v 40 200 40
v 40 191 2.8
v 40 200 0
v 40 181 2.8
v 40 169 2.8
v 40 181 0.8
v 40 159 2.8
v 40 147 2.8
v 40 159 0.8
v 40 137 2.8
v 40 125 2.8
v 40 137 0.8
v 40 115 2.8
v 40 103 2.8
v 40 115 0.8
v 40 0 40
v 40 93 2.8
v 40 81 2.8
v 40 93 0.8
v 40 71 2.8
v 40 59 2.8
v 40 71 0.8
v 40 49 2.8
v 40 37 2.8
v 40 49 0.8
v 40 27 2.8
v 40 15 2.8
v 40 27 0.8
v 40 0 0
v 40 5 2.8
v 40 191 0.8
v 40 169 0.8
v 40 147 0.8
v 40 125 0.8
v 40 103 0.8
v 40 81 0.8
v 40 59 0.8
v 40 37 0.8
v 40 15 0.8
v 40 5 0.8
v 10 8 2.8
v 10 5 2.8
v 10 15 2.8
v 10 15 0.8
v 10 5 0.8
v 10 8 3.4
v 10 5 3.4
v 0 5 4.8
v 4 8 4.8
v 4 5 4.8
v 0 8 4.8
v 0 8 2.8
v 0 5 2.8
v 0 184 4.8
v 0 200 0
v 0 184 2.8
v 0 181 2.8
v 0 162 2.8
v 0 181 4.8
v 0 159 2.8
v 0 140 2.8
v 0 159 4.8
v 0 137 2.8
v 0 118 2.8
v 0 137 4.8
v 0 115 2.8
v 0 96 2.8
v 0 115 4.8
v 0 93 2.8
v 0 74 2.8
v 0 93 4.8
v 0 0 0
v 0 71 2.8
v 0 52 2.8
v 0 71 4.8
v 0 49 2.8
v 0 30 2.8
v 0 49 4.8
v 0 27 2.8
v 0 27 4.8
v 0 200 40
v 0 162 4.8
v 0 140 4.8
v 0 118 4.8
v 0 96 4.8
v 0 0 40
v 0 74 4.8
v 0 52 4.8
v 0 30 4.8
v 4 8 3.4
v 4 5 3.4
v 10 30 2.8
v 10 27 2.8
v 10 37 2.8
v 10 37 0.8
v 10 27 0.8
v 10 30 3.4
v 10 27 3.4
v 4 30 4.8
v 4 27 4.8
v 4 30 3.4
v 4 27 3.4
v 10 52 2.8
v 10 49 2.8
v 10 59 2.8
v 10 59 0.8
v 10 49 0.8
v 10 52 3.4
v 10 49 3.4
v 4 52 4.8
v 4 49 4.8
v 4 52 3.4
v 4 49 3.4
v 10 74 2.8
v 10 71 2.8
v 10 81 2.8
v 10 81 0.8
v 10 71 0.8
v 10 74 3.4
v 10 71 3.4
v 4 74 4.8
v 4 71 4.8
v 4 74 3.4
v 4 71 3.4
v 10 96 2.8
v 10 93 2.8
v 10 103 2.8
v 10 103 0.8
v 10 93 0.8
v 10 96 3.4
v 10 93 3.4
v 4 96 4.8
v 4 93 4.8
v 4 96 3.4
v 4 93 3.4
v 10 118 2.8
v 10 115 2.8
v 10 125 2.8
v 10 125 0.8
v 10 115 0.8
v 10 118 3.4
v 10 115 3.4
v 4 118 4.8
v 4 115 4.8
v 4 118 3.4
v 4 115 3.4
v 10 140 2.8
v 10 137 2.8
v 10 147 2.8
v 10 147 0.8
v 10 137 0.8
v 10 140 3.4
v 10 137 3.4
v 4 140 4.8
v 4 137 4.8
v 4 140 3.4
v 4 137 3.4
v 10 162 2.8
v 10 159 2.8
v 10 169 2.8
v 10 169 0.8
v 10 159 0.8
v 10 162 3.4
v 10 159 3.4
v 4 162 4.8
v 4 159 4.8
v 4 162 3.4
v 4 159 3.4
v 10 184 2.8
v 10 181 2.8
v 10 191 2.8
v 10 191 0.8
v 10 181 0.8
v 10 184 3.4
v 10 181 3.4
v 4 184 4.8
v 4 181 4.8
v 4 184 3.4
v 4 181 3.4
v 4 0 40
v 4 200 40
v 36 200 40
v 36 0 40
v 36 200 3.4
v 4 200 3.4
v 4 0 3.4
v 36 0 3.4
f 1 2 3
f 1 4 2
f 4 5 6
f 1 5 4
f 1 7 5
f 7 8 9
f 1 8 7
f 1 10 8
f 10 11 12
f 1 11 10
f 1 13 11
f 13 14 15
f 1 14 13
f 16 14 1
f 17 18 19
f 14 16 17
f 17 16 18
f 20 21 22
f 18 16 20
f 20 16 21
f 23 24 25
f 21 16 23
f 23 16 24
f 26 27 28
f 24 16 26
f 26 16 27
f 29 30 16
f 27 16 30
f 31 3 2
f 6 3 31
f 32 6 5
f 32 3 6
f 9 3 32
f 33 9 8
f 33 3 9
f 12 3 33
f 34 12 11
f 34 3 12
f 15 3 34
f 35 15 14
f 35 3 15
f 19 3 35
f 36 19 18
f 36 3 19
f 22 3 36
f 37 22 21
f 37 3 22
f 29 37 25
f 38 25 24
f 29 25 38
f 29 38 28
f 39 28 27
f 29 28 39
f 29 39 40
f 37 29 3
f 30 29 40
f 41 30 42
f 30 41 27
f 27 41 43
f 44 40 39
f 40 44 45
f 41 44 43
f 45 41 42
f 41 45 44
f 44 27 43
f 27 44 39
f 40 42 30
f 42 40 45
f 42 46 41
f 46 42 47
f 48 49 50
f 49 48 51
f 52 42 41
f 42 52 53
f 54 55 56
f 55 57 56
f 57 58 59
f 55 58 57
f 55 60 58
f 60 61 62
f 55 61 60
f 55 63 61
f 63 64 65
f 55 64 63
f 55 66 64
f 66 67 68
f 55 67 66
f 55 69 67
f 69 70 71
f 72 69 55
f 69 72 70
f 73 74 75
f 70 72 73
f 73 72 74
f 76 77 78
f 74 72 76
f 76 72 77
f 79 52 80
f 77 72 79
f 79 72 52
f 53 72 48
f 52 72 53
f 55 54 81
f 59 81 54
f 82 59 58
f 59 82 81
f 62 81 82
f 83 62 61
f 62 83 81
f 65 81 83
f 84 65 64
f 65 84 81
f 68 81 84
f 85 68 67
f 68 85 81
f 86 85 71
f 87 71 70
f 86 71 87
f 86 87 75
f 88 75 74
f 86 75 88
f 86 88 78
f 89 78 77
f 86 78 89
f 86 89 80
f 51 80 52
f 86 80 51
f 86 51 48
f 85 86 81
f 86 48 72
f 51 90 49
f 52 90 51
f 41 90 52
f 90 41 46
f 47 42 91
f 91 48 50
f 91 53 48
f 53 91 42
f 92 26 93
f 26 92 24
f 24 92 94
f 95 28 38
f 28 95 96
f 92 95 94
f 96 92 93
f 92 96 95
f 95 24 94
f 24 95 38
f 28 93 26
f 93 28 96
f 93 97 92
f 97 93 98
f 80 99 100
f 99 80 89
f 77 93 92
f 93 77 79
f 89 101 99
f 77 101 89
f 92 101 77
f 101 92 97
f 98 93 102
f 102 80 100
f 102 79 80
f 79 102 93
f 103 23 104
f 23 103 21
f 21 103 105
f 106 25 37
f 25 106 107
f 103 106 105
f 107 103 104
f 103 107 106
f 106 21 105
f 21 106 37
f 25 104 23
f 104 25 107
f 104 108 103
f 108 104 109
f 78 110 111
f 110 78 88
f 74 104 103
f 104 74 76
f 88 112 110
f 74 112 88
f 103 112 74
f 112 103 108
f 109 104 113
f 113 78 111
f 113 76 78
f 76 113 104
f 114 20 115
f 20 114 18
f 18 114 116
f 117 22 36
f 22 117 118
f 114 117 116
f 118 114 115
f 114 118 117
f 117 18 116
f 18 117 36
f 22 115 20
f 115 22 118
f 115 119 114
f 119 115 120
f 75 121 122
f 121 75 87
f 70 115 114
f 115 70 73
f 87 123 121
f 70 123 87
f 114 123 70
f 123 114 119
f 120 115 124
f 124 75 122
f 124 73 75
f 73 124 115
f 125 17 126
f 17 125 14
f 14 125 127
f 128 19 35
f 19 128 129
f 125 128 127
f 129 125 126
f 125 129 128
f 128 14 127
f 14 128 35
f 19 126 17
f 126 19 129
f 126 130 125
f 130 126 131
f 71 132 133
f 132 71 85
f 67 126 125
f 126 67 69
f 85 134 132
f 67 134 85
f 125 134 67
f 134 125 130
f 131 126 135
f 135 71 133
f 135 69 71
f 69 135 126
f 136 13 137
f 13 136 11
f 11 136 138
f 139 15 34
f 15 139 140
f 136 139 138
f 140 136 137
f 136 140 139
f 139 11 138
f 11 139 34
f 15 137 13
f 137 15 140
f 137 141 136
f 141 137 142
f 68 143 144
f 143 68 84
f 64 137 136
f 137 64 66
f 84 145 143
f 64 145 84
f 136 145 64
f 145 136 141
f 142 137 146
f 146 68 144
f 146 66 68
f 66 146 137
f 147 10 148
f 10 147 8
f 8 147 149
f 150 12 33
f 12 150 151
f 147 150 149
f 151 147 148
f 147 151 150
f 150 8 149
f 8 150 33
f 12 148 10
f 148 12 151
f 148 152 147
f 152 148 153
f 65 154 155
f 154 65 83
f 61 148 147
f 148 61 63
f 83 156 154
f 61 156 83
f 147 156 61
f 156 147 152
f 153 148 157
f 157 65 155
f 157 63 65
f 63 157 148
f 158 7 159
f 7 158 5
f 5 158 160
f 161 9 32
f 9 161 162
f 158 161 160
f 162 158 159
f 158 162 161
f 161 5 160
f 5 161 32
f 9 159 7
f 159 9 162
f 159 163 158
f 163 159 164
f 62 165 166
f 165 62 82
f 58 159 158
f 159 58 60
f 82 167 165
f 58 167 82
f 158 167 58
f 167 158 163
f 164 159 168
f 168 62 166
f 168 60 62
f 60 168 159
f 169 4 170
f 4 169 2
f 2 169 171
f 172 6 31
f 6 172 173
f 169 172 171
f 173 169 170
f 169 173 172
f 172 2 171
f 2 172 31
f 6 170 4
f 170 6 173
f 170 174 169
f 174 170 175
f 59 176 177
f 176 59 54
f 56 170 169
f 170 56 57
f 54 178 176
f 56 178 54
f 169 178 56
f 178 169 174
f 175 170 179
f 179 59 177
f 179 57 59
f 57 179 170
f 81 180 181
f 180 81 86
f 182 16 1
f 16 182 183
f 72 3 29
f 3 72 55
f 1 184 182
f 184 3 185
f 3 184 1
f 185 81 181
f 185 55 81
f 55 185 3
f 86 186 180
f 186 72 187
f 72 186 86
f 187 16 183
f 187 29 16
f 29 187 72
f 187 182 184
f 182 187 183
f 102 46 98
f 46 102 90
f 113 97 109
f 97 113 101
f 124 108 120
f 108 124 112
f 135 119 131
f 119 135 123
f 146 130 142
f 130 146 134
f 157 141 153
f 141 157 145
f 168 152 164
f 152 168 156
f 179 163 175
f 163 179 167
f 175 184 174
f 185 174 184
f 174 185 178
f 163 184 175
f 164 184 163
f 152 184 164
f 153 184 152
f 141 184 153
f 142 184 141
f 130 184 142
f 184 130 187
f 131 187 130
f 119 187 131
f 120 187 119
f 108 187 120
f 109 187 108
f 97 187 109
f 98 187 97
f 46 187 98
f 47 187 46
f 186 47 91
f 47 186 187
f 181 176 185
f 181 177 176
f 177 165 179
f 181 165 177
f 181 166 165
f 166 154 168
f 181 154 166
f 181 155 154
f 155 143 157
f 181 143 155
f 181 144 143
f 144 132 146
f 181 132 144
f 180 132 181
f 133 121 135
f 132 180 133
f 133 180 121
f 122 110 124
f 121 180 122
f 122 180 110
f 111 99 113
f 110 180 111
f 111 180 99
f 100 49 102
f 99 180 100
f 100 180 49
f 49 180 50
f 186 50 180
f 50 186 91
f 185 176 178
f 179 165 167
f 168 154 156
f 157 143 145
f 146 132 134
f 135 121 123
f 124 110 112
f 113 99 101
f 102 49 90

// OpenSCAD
rail_width = 40; // x
rail_length = 200; // y
rail_height = 40;

magnet_x = 20;
magnet_y = 10;
magnet_z = 2;

magnet_border = (rail_width - magnet_x)/2;

wall_thickness = 4;
magnet_cover_thickness = 0.6;
base_thickness = 0.8;
rail_thickness = base_thickness + magnet_z + magnet_cover_thickness;



difference() {
    cube([rail_width, rail_length, rail_height]);
    translate([wall_thickness, 0, rail_thickness])
        cube([rail_width - 2*wall_thickness, 200, rail_height - rail_thickness]);
    for (i = [0:15]) {
        translate([magnet_border, 5 + i*(magnet_x + 2), base_thickness])
            cube([magnet_border + magnet_x, magnet_y, magnet_z]);
        translate([0, 5 + i*(magnet_x + 2), base_thickness+2])
            cube([magnet_border, 3, magnet_z]);
    }
}
